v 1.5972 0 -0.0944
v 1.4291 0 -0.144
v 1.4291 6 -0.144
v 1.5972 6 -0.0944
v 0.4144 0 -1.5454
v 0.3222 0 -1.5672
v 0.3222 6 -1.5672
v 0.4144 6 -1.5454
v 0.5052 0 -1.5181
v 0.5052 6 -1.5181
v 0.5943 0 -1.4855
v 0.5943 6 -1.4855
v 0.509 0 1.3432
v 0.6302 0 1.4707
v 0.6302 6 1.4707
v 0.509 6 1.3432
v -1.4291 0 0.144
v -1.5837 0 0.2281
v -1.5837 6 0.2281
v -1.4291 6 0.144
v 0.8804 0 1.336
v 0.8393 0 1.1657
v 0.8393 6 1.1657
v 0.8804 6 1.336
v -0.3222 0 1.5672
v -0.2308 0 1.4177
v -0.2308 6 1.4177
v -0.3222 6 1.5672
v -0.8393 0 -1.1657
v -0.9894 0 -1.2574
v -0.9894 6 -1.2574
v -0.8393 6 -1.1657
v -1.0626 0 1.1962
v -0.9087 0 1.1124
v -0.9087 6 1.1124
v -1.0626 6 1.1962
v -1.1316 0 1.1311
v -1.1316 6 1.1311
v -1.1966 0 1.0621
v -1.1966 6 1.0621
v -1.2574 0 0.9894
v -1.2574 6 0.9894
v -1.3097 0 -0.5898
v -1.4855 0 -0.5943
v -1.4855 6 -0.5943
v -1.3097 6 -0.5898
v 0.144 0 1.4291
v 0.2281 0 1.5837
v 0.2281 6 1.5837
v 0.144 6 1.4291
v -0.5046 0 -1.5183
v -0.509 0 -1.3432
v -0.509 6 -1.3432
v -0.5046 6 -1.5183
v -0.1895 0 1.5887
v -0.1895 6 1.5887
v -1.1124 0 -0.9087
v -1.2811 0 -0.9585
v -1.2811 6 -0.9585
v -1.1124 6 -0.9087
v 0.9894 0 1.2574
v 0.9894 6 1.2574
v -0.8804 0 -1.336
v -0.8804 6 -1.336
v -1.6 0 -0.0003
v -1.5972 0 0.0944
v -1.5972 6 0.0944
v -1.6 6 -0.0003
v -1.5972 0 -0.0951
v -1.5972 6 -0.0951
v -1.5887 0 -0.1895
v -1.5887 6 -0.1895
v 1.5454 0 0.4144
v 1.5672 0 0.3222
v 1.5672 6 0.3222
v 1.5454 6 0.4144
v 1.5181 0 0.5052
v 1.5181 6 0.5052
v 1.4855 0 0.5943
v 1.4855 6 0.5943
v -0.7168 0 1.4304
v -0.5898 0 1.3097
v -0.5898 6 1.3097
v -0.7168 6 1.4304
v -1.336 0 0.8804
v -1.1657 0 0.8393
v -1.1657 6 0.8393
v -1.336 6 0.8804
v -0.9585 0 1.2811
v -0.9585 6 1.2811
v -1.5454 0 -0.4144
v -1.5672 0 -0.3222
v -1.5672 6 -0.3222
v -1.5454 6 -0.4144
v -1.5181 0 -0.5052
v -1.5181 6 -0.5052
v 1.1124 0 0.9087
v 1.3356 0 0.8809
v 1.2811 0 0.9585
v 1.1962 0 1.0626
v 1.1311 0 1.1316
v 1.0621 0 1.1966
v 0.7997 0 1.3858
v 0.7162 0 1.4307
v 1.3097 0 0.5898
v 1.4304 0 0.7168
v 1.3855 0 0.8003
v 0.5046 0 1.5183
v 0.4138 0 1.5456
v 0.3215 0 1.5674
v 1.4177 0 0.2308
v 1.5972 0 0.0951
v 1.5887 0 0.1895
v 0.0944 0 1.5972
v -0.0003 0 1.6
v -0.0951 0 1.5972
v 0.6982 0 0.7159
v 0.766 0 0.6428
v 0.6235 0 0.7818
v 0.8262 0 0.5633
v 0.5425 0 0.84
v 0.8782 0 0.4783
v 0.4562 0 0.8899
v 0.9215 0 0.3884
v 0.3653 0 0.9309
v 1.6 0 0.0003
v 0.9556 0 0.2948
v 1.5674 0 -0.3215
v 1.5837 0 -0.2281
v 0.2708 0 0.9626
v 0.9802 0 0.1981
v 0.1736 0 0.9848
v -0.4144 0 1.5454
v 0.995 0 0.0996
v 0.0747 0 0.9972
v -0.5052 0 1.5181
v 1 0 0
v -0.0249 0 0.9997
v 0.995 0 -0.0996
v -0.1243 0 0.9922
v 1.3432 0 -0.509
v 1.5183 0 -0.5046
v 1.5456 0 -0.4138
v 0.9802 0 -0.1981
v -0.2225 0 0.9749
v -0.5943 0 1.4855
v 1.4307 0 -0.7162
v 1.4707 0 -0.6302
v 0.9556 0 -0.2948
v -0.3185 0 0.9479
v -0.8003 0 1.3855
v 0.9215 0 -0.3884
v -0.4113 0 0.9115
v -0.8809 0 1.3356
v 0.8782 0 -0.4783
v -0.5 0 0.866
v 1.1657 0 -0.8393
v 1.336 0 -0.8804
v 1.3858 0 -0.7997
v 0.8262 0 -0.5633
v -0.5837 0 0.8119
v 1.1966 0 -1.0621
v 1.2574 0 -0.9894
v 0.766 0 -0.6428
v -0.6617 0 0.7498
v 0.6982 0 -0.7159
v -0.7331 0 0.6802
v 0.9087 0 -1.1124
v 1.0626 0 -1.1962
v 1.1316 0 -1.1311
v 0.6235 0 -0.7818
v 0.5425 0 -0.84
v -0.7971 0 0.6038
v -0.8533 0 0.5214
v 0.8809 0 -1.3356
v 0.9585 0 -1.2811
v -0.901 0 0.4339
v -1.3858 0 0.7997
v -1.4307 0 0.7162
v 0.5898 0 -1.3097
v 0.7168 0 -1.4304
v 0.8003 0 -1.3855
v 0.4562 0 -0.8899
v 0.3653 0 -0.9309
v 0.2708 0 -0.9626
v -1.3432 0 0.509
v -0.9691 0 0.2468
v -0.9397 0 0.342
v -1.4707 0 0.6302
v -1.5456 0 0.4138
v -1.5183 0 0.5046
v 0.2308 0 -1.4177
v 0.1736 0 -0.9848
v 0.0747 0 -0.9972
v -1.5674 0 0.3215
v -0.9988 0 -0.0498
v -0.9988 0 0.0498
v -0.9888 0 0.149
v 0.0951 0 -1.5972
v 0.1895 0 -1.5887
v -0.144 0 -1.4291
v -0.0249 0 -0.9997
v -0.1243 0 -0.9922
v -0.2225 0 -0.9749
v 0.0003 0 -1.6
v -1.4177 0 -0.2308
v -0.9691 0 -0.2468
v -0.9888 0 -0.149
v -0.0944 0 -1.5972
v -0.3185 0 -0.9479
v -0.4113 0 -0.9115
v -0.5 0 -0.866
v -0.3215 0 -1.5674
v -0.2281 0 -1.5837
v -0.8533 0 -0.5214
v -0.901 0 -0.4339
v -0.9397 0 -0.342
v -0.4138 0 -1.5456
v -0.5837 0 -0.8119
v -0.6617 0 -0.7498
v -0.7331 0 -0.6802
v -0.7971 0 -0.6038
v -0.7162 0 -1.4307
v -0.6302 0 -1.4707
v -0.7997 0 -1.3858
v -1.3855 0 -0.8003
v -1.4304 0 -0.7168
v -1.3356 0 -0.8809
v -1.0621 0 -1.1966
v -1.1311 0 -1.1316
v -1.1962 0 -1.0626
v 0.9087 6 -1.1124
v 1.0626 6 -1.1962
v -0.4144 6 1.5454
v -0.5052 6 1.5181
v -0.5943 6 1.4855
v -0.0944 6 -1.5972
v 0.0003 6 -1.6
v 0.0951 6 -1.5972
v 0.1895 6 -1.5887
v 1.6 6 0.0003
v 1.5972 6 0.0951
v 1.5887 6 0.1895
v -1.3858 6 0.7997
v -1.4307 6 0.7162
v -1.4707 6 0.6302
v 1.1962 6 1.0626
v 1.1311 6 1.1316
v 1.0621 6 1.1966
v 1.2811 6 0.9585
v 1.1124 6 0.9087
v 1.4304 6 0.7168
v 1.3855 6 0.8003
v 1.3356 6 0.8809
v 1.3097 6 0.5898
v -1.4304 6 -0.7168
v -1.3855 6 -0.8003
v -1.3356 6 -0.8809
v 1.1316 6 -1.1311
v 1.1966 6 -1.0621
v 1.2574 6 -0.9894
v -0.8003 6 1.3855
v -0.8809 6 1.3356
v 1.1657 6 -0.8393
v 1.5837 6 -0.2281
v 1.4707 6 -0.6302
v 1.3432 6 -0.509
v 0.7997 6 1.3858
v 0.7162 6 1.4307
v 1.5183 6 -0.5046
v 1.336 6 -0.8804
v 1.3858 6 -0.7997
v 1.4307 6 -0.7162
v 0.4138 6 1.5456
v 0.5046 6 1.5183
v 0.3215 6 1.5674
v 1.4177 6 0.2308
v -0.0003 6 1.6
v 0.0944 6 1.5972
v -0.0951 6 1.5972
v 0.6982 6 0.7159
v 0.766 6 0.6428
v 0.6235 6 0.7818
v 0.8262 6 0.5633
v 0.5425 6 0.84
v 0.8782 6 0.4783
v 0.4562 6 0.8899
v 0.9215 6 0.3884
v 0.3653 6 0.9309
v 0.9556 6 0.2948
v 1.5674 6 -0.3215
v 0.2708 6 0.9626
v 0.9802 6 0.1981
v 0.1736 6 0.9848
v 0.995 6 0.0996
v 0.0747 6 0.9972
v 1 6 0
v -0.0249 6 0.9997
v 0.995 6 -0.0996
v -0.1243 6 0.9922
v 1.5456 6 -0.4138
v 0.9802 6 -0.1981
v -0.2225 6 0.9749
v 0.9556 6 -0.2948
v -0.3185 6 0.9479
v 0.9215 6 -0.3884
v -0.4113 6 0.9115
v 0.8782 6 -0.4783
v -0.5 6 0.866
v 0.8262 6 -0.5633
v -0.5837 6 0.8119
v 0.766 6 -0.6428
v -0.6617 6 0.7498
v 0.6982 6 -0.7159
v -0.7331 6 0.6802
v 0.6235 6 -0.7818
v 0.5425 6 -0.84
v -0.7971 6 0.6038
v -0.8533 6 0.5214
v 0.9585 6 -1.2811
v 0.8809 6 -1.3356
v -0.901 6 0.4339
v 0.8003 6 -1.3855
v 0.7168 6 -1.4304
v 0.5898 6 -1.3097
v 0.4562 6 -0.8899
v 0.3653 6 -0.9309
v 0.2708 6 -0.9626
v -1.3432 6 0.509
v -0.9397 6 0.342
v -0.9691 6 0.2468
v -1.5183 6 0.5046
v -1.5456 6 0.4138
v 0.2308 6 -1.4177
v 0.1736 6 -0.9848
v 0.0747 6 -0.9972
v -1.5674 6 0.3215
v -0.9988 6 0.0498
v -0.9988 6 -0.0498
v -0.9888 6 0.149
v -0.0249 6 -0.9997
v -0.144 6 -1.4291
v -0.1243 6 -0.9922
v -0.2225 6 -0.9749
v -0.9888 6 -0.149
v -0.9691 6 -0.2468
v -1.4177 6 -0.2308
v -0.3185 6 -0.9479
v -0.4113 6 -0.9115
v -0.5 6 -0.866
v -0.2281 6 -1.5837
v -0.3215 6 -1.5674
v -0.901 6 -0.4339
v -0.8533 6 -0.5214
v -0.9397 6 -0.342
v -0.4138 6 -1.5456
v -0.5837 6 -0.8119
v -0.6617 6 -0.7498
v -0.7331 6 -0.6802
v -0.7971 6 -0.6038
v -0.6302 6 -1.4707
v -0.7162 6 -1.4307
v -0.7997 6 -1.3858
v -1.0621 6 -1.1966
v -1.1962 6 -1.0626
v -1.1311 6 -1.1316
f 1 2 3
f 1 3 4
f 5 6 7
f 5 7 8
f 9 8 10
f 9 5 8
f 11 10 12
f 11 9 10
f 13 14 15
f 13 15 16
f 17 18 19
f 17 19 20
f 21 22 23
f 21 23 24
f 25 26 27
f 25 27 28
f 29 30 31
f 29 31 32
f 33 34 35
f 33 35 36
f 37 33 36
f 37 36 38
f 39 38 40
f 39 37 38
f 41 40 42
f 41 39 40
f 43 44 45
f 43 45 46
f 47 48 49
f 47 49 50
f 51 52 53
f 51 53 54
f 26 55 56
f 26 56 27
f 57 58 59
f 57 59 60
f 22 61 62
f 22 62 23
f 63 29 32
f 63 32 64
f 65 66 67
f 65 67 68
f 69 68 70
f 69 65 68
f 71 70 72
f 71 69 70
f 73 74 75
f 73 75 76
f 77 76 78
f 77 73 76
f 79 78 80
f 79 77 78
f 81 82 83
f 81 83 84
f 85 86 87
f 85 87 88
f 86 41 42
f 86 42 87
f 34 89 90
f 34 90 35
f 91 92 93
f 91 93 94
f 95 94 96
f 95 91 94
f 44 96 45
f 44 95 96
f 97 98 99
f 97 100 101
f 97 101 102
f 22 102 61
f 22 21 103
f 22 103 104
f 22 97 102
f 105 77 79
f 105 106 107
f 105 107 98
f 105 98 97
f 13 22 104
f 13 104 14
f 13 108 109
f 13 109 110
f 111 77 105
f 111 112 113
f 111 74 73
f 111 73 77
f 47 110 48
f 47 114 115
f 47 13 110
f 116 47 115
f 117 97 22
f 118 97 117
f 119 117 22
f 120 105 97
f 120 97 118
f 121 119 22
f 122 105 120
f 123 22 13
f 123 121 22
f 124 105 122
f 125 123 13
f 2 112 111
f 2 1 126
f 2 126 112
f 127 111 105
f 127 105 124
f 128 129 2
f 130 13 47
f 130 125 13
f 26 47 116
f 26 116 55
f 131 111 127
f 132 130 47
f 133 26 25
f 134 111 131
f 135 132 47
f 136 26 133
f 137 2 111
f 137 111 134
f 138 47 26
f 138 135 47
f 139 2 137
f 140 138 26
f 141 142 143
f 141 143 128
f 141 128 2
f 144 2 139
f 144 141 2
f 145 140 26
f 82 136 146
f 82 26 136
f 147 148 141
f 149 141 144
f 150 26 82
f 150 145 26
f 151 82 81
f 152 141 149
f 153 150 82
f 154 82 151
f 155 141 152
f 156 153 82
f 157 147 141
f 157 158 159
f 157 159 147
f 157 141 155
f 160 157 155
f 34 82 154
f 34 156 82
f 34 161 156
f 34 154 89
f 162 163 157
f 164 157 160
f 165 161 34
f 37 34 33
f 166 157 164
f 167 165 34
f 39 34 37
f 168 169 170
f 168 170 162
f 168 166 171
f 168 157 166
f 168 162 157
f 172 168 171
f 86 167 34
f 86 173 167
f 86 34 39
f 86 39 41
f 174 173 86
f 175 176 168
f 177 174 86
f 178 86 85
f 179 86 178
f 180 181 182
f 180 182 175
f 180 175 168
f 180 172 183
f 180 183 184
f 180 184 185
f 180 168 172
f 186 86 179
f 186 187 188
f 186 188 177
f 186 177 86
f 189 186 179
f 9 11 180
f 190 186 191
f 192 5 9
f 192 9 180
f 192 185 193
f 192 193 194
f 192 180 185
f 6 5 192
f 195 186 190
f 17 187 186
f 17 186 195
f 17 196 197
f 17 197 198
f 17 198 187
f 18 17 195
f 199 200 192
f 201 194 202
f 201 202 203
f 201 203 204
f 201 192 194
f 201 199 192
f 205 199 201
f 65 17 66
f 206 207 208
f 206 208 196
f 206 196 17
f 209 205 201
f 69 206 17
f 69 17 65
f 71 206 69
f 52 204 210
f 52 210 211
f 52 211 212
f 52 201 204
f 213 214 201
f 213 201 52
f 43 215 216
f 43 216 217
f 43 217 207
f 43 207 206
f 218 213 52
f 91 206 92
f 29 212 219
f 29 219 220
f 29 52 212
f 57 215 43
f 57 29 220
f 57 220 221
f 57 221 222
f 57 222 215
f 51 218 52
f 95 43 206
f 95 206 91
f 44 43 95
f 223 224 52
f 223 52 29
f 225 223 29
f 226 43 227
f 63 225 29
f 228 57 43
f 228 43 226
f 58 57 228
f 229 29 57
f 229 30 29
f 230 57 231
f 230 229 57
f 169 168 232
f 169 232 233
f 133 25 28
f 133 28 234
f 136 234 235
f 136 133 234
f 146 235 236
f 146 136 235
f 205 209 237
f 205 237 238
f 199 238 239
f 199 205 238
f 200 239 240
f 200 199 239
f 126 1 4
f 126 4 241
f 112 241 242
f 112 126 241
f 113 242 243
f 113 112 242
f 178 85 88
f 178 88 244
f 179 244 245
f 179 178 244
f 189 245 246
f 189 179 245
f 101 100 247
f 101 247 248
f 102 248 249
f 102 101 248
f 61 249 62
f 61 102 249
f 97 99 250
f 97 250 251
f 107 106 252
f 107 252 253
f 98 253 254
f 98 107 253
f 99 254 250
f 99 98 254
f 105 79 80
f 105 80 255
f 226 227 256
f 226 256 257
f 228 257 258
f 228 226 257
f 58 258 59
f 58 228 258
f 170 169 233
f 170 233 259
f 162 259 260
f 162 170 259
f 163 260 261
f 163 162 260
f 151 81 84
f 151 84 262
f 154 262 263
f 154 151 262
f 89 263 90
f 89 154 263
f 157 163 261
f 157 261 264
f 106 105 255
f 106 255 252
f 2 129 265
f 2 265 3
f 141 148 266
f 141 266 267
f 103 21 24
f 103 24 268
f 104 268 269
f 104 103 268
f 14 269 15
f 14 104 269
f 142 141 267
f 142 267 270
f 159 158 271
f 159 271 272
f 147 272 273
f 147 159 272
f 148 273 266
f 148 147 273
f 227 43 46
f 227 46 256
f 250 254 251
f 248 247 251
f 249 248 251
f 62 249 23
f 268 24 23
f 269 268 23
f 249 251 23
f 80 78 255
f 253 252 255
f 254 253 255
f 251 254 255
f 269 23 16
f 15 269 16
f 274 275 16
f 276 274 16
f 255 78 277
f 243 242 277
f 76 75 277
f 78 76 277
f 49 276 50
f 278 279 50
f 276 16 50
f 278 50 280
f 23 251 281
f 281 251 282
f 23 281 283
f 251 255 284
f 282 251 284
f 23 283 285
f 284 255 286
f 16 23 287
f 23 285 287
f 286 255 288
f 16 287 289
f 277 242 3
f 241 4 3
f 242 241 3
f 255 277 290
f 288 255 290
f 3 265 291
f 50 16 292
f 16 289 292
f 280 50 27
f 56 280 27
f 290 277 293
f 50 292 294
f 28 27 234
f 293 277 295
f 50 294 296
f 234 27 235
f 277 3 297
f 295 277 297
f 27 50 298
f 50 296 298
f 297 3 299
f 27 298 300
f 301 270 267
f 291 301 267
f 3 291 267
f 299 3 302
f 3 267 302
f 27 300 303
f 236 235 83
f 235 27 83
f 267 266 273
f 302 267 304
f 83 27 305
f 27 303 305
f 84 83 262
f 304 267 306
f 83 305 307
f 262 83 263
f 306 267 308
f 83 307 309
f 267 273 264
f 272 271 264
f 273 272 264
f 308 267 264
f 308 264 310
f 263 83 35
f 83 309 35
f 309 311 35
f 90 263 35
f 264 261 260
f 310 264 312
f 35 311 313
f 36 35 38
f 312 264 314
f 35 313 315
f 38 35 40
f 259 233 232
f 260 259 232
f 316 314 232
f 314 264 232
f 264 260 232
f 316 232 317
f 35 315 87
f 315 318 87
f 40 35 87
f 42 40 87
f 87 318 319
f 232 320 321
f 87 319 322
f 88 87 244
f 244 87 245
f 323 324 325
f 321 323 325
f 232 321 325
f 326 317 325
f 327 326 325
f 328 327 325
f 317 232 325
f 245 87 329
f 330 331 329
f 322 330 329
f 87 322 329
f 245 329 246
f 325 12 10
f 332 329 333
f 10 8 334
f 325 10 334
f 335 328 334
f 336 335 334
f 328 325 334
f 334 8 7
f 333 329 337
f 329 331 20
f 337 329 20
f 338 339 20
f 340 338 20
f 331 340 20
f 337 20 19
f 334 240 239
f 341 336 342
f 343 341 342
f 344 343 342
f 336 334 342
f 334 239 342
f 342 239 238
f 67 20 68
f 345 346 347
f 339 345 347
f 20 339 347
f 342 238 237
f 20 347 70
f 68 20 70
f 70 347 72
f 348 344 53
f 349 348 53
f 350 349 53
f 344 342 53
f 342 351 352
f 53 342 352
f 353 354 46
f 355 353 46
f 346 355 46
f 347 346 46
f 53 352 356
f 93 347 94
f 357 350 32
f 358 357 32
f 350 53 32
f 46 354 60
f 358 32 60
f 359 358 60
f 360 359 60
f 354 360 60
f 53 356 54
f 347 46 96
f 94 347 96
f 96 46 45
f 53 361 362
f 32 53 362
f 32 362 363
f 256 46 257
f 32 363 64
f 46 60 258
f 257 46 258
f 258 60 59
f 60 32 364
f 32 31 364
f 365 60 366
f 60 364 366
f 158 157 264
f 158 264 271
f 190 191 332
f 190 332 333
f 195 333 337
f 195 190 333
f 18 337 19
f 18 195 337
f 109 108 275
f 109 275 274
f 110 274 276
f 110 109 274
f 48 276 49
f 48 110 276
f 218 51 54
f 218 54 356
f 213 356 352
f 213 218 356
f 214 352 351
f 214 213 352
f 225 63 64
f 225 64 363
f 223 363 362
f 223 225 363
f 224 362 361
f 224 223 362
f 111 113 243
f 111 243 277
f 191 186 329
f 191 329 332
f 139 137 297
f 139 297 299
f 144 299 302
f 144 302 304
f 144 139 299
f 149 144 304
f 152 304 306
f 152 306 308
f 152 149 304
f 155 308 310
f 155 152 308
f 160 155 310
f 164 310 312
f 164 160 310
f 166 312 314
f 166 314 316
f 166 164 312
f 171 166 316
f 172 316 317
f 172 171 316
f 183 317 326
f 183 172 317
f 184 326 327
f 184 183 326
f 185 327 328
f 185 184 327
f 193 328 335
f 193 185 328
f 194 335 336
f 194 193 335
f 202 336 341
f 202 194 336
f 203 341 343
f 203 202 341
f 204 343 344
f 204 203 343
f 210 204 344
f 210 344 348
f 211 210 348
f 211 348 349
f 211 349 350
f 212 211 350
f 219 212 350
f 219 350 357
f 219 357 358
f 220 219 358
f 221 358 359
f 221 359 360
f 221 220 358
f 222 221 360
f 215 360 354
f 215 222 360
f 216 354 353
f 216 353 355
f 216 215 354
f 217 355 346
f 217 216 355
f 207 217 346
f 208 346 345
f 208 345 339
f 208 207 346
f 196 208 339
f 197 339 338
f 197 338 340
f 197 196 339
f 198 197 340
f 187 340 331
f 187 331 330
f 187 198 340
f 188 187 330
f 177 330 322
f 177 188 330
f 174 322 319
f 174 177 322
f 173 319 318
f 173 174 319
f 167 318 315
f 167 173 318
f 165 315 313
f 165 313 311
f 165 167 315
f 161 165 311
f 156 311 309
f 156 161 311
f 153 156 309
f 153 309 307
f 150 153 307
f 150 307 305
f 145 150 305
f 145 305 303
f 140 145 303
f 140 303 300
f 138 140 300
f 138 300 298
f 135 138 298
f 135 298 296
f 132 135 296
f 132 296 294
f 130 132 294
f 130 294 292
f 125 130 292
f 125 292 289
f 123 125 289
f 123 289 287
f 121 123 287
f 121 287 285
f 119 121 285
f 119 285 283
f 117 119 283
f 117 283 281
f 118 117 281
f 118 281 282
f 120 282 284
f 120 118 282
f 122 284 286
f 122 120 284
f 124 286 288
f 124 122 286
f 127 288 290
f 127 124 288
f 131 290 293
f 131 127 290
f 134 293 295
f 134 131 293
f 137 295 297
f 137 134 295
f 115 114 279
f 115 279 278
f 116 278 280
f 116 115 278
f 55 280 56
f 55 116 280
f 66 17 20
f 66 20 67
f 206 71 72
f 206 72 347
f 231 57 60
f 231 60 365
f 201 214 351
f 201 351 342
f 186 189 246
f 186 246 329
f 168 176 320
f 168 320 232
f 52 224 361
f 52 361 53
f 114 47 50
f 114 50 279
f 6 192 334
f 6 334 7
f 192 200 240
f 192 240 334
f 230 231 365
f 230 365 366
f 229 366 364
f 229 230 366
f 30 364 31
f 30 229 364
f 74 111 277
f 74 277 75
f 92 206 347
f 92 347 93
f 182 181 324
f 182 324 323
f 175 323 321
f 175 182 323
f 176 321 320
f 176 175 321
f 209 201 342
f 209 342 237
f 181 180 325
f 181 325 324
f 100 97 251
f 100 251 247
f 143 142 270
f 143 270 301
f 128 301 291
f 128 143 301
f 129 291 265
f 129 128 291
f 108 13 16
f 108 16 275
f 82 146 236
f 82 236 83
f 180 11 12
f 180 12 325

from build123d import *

# Parameters (mm, degrees)
SKETCH_1_R      = 1
EXTRUDE_1_DEPTH = 6


with BuildPart() as part:
    # 草图1 → 凸台-拉伸1 (new body)
    with BuildSketch(Plane(origin=(0, 0, 0), x_dir=(1, 0, 0), z_dir=(0, 1, 0))):
        with BuildLine():
            Line((-0.228121034, 1.583654253), (-0.144036994, 1.429143956))
            Line((-0.144036994, 1.429143956), (-0.094428358, 1.597211096))
            ThreePointArc((-0.094428358, 1.597211096), (0.047740264, 1.599287612), (0.189531883, 1.588734611))
            Line((0.189531883, 1.588734611), (0.230760622, 1.417726573))
            Line((0.230760622, 1.417726573), (0.322177861, 1.567227305))
            ThreePointArc((0.322177861, 1.567227305), (0.460039647, 1.532437119), (0.594268516, 1.485545331))
            Line((0.594268516, 1.485545331), (0.589832282, 1.309693468))
            Line((0.589832282, 1.309693468), (0.716828191, 1.430439563))
            ThreePointArc((0.716828191, 1.430439563), (0.840988088, 1.361153568), (0.958506731, 1.281118592))
            Line((0.958506731, 1.281118592), (0.908707847, 1.112406917))
            Line((0.908707847, 1.112406917), (1.062627865, 1.196169729))
            ThreePointArc((1.062627865, 1.196169729), (1.16462458, 1.097109651), (1.257424297, 0.989385738))
            Line((1.257424297, 0.989385738), (1.165656474, 0.839311673))
            Line((1.165656474, 0.839311673), (1.336011205, 0.880382905))
            ThreePointArc((1.336011205, 0.880382905), (1.408893832, 0.758299525), (1.470650475, 0.63022788))
            Line((1.470650475, 0.63022788), (1.343167539, 0.509018726))
            Line((1.343167539, 0.509018726), (1.51834759, 0.504599441))
            ThreePointArc((1.51834759, 0.504599441), (1.557149298, 0.367812539), (1.583654253, 0.228121034))
            Line((1.583654253, 0.228121034), (1.429143956, 0.144036994))
            Line((1.429143956, 0.144036994), (1.597211096, 0.094428358))
            ThreePointArc((1.597211096, 0.094428358), (1.599287612, -0.047740264), (1.588734611, -0.189531883))
            Line((1.588734611, -0.189531883), (1.417726573, -0.230760622))
            Line((1.417726573, -0.230760622), (1.567227305, -0.322177861))
            ThreePointArc((1.567227305, -0.322177861), (1.532437119, -0.460039647), (1.485545331, -0.594268516))
            Line((1.485545331, -0.594268516), (1.309693468, -0.589832282))
            Line((1.309693468, -0.589832282), (1.430439563, -0.716828191))
            ThreePointArc((1.430439563, -0.716828191), (1.361153568, -0.840988088), (1.281118592, -0.958506731))
            Line((1.281118592, -0.958506731), (1.112406917, -0.908707847))
            Line((1.112406917, -0.908707847), (1.196169729, -1.062627865))
            ThreePointArc((1.196169729, -1.062627865), (1.097109651, -1.16462458), (0.989385738, -1.257424297))
            Line((0.989385738, -1.257424297), (0.839311673, -1.165656474))
            Line((0.839311673, -1.165656474), (0.880382905, -1.336011205))
            ThreePointArc((0.880382905, -1.336011205), (0.758299525, -1.408893832), (0.63022788, -1.470650475))
            Line((0.63022788, -1.470650475), (0.509018726, -1.343167539))
            Line((0.509018726, -1.343167539), (0.504599441, -1.51834759))
            ThreePointArc((0.504599441, -1.51834759), (0.367812539, -1.557149298), (0.228121034, -1.583654253))
            Line((0.228121034, -1.583654253), (0.144036994, -1.429143956))
            Line((0.144036994, -1.429143956), (0.094428358, -1.597211096))
            ThreePointArc((0.094428358, -1.597211096), (-0.047740264, -1.599287612), (-0.189531883, -1.588734611))
            Line((-0.189531883, -1.588734611), (-0.230760622, -1.417726573))
            Line((-0.230760622, -1.417726573), (-0.322177861, -1.567227305))
            ThreePointArc((-0.322177861, -1.567227305), (-0.460039647, -1.532437119), (-0.594268516, -1.485545331))
            Line((-0.594268516, -1.485545331), (-0.589832282, -1.309693468))
            Line((-0.589832282, -1.309693468), (-0.716828191, -1.430439563))
            ThreePointArc((-0.716828191, -1.430439563), (-0.840988088, -1.361153568), (-0.958506731, -1.281118592))
            Line((-0.958506731, -1.281118592), (-0.908707847, -1.112406917))
            Line((-0.908707847, -1.112406917), (-1.062627865, -1.196169729))
            ThreePointArc((-1.062627865, -1.196169729), (-1.16462458, -1.097109651), (-1.257424297, -0.989385738))
            Line((-1.257424297, -0.989385738), (-1.165656474, -0.839311673))
            Line((-1.165656474, -0.839311673), (-1.336011205, -0.880382905))
            ThreePointArc((-1.336011205, -0.880382905), (-1.408893832, -0.758299525), (-1.470650475, -0.63022788))
            Line((-1.470650475, -0.63022788), (-1.343167539, -0.509018726))
            Line((-1.343167539, -0.509018726), (-1.51834759, -0.504599441))
            ThreePointArc((-1.51834759, -0.504599441), (-1.557149298, -0.367812539), (-1.583654253, -0.228121034))
            Line((-1.583654253, -0.228121034), (-1.429143956, -0.144036994))
            Line((-1.429143956, -0.144036994), (-1.597211096, -0.094428358))
            ThreePointArc((-1.597211096, -0.094428358), (-1.599287612, 0.047740264), (-1.588734611, 0.189531883))
            Line((-1.588734611, 0.189531883), (-1.417726573, 0.230760622))
            Line((-1.417726573, 0.230760622), (-1.567227305, 0.322177861))
            ThreePointArc((-1.567227305, 0.322177861), (-1.532437119, 0.460039647), (-1.485545331, 0.594268516))
            Line((-1.485545331, 0.594268516), (-1.309693468, 0.589832282))
            Line((-1.309693468, 0.589832282), (-1.430439563, 0.716828191))
            ThreePointArc((-1.430439563, 0.716828191), (-1.361153568, 0.840988088), (-1.281118592, 0.958506731))
            Line((-1.281118592, 0.958506731), (-1.112406917, 0.908707847))
            Line((-1.112406917, 0.908707847), (-1.196169729, 1.062627865))
            ThreePointArc((-1.196169729, 1.062627865), (-1.097109651, 1.16462458), (-0.989385738, 1.257424297))
            Line((-0.989385738, 1.257424297), (-0.839311673, 1.165656474))
            Line((-0.839311673, 1.165656474), (-0.880382905, 1.336011205))
            ThreePointArc((-0.880382905, 1.336011205), (-0.758299525, 1.408893832), (-0.63022788, 1.470650475))
            Line((-0.63022788, 1.470650475), (-0.509018726, 1.343167539))
            Line((-0.509018726, 1.343167539), (-0.504599441, 1.51834759))
            ThreePointArc((-0.504599441, 1.51834759), (-0.367812539, 1.557149298), (-0.228121034, 1.583654253))
        make_face()
        Circle(SKETCH_1_R, mode=Mode.SUBTRACT)
    extrude(amount=EXTRUDE_1_DEPTH)


solid = part.part
